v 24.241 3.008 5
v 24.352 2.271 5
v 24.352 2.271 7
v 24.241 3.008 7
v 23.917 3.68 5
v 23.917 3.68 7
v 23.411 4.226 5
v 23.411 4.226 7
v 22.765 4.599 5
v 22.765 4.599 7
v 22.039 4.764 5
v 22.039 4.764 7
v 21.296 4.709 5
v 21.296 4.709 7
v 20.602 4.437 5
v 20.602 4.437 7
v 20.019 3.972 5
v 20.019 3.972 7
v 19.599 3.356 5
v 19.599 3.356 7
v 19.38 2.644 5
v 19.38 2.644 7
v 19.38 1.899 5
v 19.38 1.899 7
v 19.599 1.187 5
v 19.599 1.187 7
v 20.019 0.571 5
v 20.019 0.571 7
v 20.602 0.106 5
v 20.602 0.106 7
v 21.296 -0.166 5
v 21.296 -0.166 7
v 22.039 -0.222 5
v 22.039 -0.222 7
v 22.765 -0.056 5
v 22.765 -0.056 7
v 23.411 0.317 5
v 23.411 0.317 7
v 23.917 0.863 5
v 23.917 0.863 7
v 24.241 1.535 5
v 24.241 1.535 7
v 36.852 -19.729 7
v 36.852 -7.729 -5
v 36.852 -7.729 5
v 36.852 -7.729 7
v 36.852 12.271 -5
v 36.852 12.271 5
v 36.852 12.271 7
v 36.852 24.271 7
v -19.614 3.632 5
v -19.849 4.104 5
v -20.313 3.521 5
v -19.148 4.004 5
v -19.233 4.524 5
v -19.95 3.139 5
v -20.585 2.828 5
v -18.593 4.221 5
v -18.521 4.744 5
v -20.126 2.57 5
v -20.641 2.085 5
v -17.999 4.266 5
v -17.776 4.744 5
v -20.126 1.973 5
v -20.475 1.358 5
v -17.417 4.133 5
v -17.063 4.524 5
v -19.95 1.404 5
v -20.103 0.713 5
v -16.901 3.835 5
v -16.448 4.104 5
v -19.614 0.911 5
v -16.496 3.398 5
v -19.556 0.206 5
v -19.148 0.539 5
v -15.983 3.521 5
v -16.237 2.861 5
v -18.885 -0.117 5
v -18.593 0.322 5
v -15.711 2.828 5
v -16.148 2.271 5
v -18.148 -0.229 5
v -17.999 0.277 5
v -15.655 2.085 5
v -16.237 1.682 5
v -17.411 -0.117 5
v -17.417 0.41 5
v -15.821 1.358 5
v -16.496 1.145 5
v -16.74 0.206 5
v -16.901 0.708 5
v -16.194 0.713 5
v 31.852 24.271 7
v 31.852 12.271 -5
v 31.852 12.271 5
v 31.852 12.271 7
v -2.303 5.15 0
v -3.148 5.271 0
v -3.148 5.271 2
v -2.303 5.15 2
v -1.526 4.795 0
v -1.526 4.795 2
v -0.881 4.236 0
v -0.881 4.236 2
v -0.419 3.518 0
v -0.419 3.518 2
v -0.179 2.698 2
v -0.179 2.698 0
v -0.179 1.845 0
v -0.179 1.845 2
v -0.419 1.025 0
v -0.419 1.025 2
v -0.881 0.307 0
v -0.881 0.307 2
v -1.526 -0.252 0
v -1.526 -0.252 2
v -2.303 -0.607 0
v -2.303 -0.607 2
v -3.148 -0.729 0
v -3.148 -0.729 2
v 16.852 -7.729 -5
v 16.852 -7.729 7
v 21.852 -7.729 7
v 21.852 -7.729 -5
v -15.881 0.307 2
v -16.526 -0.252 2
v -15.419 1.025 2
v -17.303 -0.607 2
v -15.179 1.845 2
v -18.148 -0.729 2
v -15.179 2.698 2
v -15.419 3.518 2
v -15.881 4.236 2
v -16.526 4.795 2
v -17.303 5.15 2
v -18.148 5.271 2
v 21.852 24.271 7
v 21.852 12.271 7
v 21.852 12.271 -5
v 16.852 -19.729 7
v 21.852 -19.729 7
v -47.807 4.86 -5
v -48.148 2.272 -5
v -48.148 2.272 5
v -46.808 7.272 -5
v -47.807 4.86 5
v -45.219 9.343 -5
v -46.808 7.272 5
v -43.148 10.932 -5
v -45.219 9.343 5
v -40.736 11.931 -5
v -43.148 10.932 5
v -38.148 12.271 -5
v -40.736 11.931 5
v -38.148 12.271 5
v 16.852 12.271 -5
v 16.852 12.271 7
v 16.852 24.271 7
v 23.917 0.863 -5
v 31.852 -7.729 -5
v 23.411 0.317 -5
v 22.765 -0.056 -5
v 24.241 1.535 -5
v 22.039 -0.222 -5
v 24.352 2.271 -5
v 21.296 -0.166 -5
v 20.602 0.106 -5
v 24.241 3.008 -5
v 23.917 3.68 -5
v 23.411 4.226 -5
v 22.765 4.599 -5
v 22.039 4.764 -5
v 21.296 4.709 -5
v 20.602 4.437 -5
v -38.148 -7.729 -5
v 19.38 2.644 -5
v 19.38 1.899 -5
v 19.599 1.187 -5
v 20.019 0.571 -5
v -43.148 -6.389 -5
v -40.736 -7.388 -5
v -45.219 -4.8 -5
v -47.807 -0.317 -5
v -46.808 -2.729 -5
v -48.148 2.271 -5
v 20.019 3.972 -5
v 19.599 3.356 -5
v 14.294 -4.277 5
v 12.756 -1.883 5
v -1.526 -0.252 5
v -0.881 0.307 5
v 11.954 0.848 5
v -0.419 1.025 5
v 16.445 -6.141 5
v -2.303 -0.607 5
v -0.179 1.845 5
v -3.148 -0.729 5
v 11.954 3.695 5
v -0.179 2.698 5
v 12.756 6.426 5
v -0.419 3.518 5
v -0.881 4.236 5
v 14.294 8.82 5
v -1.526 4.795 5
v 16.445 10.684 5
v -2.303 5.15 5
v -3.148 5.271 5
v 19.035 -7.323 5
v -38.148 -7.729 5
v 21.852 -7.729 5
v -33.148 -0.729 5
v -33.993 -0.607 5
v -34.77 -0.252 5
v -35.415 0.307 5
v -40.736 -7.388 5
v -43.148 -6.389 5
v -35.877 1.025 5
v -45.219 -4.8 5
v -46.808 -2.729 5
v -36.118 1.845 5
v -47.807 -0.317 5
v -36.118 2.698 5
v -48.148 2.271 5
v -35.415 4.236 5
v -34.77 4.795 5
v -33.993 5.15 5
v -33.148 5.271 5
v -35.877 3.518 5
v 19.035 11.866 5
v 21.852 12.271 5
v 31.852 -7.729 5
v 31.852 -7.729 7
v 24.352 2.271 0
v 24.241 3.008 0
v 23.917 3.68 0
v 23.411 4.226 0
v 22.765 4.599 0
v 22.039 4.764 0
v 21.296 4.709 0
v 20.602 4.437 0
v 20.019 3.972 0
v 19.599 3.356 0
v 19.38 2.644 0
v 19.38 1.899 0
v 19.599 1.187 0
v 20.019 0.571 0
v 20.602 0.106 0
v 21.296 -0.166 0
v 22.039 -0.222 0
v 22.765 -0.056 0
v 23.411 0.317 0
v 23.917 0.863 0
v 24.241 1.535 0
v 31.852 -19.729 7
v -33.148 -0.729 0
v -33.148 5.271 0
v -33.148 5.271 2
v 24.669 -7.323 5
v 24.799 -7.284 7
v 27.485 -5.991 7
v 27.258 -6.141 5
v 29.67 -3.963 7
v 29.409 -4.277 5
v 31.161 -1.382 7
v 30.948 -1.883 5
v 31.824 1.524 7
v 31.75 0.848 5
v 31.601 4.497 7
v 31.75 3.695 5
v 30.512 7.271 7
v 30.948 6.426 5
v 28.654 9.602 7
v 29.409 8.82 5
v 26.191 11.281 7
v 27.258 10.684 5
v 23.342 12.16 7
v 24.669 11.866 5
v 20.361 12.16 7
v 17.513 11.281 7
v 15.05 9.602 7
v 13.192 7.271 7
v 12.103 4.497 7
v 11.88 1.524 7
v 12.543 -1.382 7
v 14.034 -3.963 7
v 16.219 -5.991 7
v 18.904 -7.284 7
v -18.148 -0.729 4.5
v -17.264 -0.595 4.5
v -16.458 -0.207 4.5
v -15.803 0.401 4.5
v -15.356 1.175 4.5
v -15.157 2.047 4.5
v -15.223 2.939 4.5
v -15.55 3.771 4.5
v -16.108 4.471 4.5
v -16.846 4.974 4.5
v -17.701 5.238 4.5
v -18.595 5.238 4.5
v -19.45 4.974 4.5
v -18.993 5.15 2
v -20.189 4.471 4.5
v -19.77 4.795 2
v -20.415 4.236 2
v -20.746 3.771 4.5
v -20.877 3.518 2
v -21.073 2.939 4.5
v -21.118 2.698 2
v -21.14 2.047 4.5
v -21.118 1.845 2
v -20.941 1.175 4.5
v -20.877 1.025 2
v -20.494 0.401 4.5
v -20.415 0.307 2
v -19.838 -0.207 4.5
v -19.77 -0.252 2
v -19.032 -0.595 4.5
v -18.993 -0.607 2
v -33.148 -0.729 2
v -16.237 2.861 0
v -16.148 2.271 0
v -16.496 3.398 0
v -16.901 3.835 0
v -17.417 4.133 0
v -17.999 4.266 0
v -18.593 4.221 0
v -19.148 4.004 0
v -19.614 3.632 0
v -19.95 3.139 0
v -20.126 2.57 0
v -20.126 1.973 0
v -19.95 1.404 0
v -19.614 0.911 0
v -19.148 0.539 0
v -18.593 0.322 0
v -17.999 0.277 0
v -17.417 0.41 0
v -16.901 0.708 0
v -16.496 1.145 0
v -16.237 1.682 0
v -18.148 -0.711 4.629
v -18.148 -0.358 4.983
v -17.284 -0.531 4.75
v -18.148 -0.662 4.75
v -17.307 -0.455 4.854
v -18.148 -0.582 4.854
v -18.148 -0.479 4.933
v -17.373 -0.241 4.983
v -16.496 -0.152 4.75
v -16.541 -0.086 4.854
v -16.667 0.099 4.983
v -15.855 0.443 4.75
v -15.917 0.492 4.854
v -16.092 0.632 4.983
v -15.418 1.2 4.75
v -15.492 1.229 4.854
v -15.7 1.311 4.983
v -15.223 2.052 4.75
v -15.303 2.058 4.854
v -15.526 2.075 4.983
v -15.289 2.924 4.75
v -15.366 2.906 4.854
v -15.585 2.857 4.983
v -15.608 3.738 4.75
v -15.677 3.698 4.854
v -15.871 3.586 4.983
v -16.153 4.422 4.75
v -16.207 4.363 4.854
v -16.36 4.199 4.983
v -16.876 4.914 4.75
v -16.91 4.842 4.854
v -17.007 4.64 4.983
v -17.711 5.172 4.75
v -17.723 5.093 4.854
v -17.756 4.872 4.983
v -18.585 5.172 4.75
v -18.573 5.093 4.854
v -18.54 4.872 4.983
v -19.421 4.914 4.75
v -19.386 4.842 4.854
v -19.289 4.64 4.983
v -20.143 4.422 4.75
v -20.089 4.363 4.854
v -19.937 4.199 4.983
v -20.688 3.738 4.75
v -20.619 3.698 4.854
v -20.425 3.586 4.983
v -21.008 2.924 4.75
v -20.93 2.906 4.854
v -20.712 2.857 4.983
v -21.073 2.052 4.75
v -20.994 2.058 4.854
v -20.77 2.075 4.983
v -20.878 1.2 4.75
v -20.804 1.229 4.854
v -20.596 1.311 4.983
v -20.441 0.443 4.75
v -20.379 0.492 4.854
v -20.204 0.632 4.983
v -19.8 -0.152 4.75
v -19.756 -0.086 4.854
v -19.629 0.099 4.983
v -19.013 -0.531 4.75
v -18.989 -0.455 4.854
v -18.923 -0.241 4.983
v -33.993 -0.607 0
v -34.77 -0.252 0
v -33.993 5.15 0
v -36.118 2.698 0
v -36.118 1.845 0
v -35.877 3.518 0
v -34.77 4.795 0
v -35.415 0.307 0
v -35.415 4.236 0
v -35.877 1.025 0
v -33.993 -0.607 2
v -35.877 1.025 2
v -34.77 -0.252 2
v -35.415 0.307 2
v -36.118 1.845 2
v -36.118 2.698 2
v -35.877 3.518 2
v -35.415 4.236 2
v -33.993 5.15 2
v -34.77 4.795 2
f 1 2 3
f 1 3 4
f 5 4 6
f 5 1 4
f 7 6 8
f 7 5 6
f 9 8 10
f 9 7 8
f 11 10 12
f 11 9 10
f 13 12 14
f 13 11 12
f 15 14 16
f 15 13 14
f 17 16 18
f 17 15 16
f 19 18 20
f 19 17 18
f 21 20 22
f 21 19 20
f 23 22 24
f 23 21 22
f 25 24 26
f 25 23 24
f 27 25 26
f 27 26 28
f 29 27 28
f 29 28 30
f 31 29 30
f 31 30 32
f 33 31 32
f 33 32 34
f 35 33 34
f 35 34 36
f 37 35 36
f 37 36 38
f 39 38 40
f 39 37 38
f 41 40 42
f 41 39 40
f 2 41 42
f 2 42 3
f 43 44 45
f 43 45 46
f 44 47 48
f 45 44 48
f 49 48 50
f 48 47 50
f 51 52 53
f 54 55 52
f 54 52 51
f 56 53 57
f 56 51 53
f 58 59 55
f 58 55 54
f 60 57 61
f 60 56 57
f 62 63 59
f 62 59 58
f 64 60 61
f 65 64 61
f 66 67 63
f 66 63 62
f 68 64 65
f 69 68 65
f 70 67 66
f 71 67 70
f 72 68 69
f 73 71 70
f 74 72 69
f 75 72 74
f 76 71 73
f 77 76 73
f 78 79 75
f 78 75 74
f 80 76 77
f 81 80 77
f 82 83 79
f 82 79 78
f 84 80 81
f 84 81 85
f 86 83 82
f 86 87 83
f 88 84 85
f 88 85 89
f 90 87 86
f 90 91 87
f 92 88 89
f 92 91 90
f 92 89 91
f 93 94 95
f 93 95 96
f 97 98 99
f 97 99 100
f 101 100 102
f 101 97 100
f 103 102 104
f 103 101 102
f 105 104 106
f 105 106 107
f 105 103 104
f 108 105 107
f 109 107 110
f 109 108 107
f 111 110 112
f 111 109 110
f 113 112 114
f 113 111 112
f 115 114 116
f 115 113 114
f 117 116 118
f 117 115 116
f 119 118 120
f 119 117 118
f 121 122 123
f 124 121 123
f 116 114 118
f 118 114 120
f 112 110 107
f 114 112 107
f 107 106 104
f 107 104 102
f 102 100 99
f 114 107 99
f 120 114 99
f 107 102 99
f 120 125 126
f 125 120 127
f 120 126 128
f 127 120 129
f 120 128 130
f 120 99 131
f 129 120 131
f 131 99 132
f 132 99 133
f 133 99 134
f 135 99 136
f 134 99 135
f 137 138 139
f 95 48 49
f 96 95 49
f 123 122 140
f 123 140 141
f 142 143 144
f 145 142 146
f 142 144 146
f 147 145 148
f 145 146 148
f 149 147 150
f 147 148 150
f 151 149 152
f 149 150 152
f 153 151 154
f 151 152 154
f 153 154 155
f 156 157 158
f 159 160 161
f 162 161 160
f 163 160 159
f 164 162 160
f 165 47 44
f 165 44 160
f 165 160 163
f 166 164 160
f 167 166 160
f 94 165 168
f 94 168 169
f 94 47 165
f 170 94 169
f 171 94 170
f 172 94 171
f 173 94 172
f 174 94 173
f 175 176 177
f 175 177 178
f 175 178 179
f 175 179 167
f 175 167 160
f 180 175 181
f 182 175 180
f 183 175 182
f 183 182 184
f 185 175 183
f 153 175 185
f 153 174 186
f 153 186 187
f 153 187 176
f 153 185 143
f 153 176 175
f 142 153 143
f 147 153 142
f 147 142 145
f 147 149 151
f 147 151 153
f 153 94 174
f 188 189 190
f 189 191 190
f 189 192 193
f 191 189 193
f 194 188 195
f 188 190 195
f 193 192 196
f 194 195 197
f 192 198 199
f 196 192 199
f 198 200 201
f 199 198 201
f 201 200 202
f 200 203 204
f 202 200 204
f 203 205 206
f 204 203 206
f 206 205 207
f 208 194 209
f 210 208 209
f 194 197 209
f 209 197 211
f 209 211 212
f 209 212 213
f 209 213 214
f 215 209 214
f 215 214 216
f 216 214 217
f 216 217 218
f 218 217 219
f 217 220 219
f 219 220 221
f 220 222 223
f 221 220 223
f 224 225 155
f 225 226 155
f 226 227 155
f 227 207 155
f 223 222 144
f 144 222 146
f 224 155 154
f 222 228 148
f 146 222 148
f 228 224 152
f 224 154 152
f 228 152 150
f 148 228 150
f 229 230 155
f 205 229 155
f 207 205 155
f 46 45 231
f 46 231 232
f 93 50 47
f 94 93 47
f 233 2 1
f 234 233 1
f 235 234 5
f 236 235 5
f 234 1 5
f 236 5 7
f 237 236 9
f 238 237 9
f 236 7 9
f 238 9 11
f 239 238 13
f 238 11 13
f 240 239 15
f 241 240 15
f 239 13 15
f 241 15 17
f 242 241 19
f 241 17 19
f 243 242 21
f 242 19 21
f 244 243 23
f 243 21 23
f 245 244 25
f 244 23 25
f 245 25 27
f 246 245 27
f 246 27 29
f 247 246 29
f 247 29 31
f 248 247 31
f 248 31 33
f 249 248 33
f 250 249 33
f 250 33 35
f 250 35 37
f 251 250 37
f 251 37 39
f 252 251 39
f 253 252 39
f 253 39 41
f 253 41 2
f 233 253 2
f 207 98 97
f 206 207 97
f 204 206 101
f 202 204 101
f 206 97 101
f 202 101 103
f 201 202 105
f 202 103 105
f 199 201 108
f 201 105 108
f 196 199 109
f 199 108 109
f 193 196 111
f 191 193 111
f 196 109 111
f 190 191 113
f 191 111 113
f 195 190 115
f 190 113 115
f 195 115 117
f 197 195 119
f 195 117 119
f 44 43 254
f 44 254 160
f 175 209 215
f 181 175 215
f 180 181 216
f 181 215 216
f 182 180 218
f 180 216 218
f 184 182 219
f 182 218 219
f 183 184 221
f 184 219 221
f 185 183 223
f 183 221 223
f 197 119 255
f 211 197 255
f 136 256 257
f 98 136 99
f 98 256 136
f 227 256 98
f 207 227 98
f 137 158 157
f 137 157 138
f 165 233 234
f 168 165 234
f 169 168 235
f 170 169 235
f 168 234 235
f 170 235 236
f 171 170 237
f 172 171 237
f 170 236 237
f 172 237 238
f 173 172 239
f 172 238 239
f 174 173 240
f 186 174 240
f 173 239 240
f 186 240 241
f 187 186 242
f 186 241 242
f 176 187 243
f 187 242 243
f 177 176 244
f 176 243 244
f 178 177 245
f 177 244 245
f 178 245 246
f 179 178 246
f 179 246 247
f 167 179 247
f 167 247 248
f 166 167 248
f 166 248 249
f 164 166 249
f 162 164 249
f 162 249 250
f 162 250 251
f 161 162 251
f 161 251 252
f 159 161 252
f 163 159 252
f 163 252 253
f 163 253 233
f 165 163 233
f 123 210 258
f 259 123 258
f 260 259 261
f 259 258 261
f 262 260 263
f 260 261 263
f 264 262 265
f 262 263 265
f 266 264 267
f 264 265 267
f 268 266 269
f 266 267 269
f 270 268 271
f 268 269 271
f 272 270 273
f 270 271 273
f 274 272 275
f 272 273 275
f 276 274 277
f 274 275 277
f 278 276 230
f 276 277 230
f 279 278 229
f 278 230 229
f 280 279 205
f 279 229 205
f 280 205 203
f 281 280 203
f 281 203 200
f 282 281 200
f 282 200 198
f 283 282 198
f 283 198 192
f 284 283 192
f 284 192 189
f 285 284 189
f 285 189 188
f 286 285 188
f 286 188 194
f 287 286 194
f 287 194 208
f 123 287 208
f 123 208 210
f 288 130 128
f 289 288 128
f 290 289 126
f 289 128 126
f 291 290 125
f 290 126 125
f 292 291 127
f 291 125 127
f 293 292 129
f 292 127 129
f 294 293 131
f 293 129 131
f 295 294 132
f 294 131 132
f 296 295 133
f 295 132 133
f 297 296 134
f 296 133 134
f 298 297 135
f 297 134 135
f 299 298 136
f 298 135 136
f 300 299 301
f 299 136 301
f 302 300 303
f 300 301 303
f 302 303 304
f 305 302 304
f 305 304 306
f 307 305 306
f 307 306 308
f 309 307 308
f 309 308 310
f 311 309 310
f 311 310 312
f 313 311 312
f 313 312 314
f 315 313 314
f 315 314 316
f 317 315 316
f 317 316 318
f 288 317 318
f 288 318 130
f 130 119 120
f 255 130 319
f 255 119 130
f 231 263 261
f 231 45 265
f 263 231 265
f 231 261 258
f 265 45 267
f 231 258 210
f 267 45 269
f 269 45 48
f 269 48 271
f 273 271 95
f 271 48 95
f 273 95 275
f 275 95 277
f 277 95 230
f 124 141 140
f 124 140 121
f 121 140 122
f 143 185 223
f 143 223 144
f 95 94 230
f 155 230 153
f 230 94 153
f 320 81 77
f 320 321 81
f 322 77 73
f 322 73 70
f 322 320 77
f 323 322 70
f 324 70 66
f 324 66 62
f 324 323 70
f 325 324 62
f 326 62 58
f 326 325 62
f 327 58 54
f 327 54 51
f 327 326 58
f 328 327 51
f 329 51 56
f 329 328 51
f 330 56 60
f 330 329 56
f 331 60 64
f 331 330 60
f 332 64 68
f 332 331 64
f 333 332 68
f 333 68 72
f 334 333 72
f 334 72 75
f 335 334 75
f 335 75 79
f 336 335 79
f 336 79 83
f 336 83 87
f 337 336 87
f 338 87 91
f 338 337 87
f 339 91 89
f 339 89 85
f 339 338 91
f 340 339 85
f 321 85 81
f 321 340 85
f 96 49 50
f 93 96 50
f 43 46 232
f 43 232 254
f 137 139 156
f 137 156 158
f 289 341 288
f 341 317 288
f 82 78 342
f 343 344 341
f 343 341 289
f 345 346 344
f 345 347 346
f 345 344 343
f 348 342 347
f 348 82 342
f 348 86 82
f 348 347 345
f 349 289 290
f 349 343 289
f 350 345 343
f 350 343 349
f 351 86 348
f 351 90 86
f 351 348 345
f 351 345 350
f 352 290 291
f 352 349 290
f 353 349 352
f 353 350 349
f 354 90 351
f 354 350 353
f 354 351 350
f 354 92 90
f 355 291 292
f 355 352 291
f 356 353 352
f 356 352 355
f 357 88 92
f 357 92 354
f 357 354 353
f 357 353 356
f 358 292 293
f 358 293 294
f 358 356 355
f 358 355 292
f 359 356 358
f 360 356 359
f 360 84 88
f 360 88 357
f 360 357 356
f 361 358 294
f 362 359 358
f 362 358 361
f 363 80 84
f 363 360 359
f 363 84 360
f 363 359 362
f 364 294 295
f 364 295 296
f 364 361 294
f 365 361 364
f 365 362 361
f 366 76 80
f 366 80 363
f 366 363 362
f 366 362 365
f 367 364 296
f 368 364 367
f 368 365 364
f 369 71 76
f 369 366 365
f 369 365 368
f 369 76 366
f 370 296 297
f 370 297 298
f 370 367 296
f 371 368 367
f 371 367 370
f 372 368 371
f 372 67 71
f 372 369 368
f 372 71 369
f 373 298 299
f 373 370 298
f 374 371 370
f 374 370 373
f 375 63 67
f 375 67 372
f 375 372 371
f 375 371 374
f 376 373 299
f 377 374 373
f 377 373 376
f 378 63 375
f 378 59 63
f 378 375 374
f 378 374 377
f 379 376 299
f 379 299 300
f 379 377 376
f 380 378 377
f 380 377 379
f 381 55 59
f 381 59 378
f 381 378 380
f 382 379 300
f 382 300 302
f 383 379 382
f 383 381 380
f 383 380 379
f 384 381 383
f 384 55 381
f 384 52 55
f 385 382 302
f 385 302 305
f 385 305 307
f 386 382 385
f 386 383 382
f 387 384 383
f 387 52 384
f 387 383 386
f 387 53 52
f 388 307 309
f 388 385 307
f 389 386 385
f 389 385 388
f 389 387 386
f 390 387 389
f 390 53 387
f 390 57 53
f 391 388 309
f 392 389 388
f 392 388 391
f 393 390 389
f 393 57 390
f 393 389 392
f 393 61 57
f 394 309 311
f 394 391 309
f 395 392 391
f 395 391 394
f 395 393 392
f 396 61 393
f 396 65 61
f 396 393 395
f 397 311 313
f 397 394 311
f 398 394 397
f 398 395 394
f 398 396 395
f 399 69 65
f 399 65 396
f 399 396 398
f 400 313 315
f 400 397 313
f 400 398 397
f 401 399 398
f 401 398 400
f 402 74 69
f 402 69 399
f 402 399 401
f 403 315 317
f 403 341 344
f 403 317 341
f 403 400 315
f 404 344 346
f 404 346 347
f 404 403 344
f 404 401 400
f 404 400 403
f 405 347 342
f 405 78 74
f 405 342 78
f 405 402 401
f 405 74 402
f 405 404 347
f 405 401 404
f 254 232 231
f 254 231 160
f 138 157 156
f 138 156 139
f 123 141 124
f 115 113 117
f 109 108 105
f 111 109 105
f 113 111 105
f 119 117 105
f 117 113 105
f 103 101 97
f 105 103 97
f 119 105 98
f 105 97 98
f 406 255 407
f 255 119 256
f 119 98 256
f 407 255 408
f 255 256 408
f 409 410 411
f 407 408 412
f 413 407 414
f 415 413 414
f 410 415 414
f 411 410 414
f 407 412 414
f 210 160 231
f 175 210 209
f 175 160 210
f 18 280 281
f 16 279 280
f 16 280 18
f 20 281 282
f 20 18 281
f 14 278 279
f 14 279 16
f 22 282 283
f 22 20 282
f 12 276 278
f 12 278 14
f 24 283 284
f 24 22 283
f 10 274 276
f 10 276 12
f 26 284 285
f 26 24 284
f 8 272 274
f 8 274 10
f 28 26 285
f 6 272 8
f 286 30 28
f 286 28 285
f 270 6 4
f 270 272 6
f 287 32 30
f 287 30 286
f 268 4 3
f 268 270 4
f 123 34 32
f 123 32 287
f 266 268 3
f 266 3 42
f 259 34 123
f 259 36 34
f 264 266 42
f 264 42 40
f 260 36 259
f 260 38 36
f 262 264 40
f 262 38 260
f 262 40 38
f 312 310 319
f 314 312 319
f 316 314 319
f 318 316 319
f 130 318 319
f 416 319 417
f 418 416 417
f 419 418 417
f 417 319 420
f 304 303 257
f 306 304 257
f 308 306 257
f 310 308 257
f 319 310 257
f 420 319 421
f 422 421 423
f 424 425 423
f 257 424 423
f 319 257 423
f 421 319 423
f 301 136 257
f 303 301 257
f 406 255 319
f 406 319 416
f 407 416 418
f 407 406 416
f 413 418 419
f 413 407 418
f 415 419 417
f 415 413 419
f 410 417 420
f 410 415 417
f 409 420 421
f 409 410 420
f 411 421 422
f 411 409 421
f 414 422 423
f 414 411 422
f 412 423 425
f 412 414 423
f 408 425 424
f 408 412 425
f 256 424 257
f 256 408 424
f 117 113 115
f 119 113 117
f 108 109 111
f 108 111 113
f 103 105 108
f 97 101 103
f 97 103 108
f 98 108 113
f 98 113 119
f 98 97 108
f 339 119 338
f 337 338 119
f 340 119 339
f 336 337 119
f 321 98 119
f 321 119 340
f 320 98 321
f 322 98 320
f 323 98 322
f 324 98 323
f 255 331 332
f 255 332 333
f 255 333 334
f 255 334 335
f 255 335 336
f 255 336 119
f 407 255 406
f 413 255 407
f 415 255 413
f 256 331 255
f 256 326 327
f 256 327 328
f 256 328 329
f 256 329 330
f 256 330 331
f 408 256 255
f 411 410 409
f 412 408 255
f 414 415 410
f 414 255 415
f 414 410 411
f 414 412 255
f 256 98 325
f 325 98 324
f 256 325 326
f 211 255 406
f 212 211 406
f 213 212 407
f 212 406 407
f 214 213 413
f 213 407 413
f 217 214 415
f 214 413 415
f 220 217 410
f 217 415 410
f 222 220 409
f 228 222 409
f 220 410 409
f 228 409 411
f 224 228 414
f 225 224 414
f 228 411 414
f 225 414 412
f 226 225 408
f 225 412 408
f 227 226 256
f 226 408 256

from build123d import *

# Parameters (mm, degrees)
SKETCH1_R             = 2
BOSS_EXTRUDE1_DEPTH   = 2
SKETCH2_R             = 3
SKETCH2_R_2           = 2
BOSS_EXTRUDE2_DEPTH   = 3
FILLET1_R             = 0.5
SKETCH4_W             = 90
SKETCH4_H             = 20
BOSS_EXTRUDE3_DEPTH   = 5
SKETCH5_W             = 90
SKETCH5_H             = 20
BOSS_EXTRUDE6_DEPTH   = 5
FILLET3_R             = 10
FILLET4_R             = 10
FILLET5_R             = 10
FILLET6_R             = 10
SKETCH7_R             = 2.5
CUT_EXTRUDE1_DEPTH    = 10
SKETCH8_R             = 10
SKETCH8_R_2           = 2.5
BOSS_EXTRUDE7_DEPTH   = 2
SKETCH9_W             = 5
SKETCH9_H             = 20
CUT_EXTRUDE2_DEPTH    = 10
BOSS_EXTRUDE8_DEPTH   = 5
SKETCH11_W            = 5
SKETCH11_H            = 12
BOSS_EXTRUDE9_DEPTH   = 12
BOSS_EXTRUDE9_2_DEPTH = 12
CUT_EXTRUDE3_DEPTH    = 12


with BuildPart() as part:
    # Sketch1 → Boss-Extrude1 (new body)
    with BuildSketch(Plane.XY):
        with BuildLine():
            Line((-33.148143839, 5.271469366), (-3.148143839, 5.271469366))
            ThreePointArc((-3.148143839, 5.271469366), (-0.148143839, 2.271469366), (-3.148143839, -0.728530634))
            Line((-3.148143839, -0.728530634), (-33.148143839, -0.728530634))
            ThreePointArc((-33.148143839, -0.728530634), (-36.148143839, 2.271469366), (-33.148143839, 5.271469366))
        make_face()
        with Locations((-18.148143839, 2.271469366)):
            Circle(SKETCH1_R, mode=Mode.SUBTRACT)
    extrude(amount=BOSS_EXTRUDE1_DEPTH)

    # Sketch2 → Boss-Extrude2 (add)
    with BuildSketch(Plane.XY.offset(2)):
        with Locations(Location((-18.148143839, 2.271469366, 0), (0, 0, 270))):
            Circle(SKETCH2_R)
        with Locations((-18.148143839, 2.271469366)):
            Circle(SKETCH2_R_2, mode=Mode.SUBTRACT)
    extrude(amount=BOSS_EXTRUDE2_DEPTH)

    # Fillet1
    fillet1_edges = [part.edges().sort_by_distance(p)[0] for p in [
        (-18.148143839, 5.271469366, 5),
    ]]
    fillet(fillet1_edges, radius=FILLET1_R)


with BuildPart() as body_2:
    # Sketch4 → Boss-Extrude3 (new body)
    with BuildSketch(Plane(origin=(0, 0, 0), x_dir=(-1, 0, 0), z_dir=(0, 0, -1))):
        with Locations((3.148143839, 2.271469366)):
            Rectangle(SKETCH4_W, SKETCH4_H)
        with BuildLine():
            ThreePointArc((33.148143839, -0.728530634), (36.148143839, 2.271469366), (33.148143839, 5.271469366))
            Line((33.148143839, 5.271469366), (3.148143839, 5.271469366))
            ThreePointArc((3.148143839, 5.271469366), (0.148143839, 2.271469366), (3.148143839, -0.728530634))
            Line((3.148143839, -0.728530634), (33.148143839, -0.728530634))
        make_face(mode=Mode.SUBTRACT)
    extrude(amount=-BOSS_EXTRUDE3_DEPTH)

    # Fillet3
    fillet3_edges = [body_2.edges().sort_by_distance(p)[0] for p in [
        (-48.148143839, -7.728530634, 2.5),
    ]]
    fillet(fillet3_edges, radius=FILLET3_R)

    # Fillet6
    fillet6_edges = [body_2.edges().sort_by_distance(p)[0] for p in [
        (-48.148143839, 12.271469366, 2.5),
    ]]
    fillet(fillet6_edges, radius=FILLET6_R - 0.0001)  # a hair under: the kernel refuses the full size


with BuildPart() as body_3:
    # Sketch5 → Boss-Extrude6 (new body)
    with BuildSketch(Plane(origin=(0, 0, 0), x_dir=(-1, 0, 0), z_dir=(0, 0, -1))):
        with Locations((3.148143839, 2.271469366)):
            Rectangle(SKETCH5_W, SKETCH5_H)
    extrude(amount=BOSS_EXTRUDE6_DEPTH)

    # Fillet4
    fillet4_edges = [body_3.edges().sort_by_distance(p)[0] for p in [
        (-48.148143839, -7.728530634, -2.5),
    ]]
    fillet(fillet4_edges, radius=FILLET4_R)

    # Fillet5
    fillet5_edges = [body_3.edges().sort_by_distance(p)[0] for p in [
        (-48.148143839, 12.271469366, -2.5),
    ]]
    fillet(fillet5_edges, radius=FILLET5_R - 0.0001)  # a hair under: the kernel refuses the full size


with BuildPart() as cut_extrude1_tool:
    # Sketch7 → Cut-Extrude1 (new body)
    with BuildSketch(Plane.XY.offset(5)):
        with Locations((21.851856161, 2.271469366)):
            Circle(SKETCH7_R)
    extrude(amount=-CUT_EXTRUDE1_DEPTH)


with BuildPart() as body_2_1:
    add(body_2.part)

    # Cut-Extrude1: cut by cut_extrude1_tool
    add(cut_extrude1_tool.part, mode=Mode.SUBTRACT)

    # Sketch8 → Boss-Extrude7 (add)
    with BuildSketch(Plane.XY.offset(5)):
        with Locations(Location((21.851856161, 2.271469366, 0), (0, 0, 270))):
            Circle(SKETCH8_R)
        with Locations((21.851856161, 2.271469366)):
            Circle(SKETCH8_R_2, mode=Mode.SUBTRACT)
    extrude(amount=BOSS_EXTRUDE7_DEPTH)


with BuildPart() as body_3_1:
    add(body_3.part)

    # Cut-Extrude1: cut by cut_extrude1_tool
    add(cut_extrude1_tool.part, mode=Mode.SUBTRACT)


with BuildPart() as cut_extrude2_tool:
    # Sketch9 → Cut-Extrude2 (new body)
    with BuildSketch(Plane.XY.offset(5)):
        with Locations((39.351856161, 2.271469366)):
            Rectangle(SKETCH9_W, SKETCH9_H)
    extrude(amount=-CUT_EXTRUDE2_DEPTH)


with BuildPart() as body_2_2:
    add(body_2_1.part)

    # Cut-Extrude2: cut by cut_extrude2_tool
    add(cut_extrude2_tool.part, mode=Mode.SUBTRACT)



with BuildPart() as body_3_2:
    add(body_3_1.part)

    # Cut-Extrude2: cut by cut_extrude2_tool
    add(cut_extrude2_tool.part, mode=Mode.SUBTRACT)


with BuildPart() as body_2_3:
    add(body_2_2.part)

    add(body_3_2.part)  # Boss-Extrude8 merges body 3
    # Sketch10 → Boss-Extrude8 (add)
    with BuildSketch(Plane(origin=(36.851856161, 0, 0), x_dir=(0, 0, -1), z_dir=(1, 0, 0))):
        Polygon((5, 12.271469366), (-7, 12.271469366), (-7, 24.271469366), align=None)
        Polygon((5, -7.728530634), (-7, -7.728530634), (-7, -19.728530634), align=None)
    extrude(amount=-BOSS_EXTRUDE8_DEPTH)


with BuildPart() as body_3_2_1:
    # Sketch11 → Boss-Extrude9 (new body)
    with BuildSketch(Plane.XY.offset(7)):
        with Locations((19.351856161, 18.271469366)):
            Rectangle(SKETCH11_W, SKETCH11_H)
    extrude(amount=-BOSS_EXTRUDE9_DEPTH)


with BuildPart() as body_4:
    # Sketch11 → Boss-Extrude9 2 (new body)
    with BuildSketch(Plane.XY.offset(7)):
        with Locations((19.351856161, -13.728530634)):
            Rectangle(SKETCH11_W, SKETCH11_H)
    extrude(amount=-BOSS_EXTRUDE9_2_DEPTH)


with BuildPart() as cut_extrude3_tool:
    # Sketch12 → Cut-Extrude3 (new body)
    with BuildSketch(Plane(origin=(21.851856161, 0, 0), x_dir=(0, 0, -1), z_dir=(1, 0, 0))):
        Polygon((-7, 24.271469366), (5, 24.271469366), (5, 12.271469366), align=None)
        Polygon((5, -7.728530634), (5, -19.728530634), (-7, -19.728530634), align=None)
    extrude(amount=-CUT_EXTRUDE3_DEPTH)


with BuildPart() as body_3_2_2:
    add(body_3_2_1.part)

    # Cut-Extrude3: cut by cut_extrude3_tool
    add(cut_extrude3_tool.part, mode=Mode.SUBTRACT)


with BuildPart() as body_4_1:
    add(body_4.part)

    # Cut-Extrude3: cut by cut_extrude3_tool
    add(cut_extrude3_tool.part, mode=Mode.SUBTRACT)


solid = Compound([part.part, body_2_3.part, body_3_2_2.part, body_4_1.part])
